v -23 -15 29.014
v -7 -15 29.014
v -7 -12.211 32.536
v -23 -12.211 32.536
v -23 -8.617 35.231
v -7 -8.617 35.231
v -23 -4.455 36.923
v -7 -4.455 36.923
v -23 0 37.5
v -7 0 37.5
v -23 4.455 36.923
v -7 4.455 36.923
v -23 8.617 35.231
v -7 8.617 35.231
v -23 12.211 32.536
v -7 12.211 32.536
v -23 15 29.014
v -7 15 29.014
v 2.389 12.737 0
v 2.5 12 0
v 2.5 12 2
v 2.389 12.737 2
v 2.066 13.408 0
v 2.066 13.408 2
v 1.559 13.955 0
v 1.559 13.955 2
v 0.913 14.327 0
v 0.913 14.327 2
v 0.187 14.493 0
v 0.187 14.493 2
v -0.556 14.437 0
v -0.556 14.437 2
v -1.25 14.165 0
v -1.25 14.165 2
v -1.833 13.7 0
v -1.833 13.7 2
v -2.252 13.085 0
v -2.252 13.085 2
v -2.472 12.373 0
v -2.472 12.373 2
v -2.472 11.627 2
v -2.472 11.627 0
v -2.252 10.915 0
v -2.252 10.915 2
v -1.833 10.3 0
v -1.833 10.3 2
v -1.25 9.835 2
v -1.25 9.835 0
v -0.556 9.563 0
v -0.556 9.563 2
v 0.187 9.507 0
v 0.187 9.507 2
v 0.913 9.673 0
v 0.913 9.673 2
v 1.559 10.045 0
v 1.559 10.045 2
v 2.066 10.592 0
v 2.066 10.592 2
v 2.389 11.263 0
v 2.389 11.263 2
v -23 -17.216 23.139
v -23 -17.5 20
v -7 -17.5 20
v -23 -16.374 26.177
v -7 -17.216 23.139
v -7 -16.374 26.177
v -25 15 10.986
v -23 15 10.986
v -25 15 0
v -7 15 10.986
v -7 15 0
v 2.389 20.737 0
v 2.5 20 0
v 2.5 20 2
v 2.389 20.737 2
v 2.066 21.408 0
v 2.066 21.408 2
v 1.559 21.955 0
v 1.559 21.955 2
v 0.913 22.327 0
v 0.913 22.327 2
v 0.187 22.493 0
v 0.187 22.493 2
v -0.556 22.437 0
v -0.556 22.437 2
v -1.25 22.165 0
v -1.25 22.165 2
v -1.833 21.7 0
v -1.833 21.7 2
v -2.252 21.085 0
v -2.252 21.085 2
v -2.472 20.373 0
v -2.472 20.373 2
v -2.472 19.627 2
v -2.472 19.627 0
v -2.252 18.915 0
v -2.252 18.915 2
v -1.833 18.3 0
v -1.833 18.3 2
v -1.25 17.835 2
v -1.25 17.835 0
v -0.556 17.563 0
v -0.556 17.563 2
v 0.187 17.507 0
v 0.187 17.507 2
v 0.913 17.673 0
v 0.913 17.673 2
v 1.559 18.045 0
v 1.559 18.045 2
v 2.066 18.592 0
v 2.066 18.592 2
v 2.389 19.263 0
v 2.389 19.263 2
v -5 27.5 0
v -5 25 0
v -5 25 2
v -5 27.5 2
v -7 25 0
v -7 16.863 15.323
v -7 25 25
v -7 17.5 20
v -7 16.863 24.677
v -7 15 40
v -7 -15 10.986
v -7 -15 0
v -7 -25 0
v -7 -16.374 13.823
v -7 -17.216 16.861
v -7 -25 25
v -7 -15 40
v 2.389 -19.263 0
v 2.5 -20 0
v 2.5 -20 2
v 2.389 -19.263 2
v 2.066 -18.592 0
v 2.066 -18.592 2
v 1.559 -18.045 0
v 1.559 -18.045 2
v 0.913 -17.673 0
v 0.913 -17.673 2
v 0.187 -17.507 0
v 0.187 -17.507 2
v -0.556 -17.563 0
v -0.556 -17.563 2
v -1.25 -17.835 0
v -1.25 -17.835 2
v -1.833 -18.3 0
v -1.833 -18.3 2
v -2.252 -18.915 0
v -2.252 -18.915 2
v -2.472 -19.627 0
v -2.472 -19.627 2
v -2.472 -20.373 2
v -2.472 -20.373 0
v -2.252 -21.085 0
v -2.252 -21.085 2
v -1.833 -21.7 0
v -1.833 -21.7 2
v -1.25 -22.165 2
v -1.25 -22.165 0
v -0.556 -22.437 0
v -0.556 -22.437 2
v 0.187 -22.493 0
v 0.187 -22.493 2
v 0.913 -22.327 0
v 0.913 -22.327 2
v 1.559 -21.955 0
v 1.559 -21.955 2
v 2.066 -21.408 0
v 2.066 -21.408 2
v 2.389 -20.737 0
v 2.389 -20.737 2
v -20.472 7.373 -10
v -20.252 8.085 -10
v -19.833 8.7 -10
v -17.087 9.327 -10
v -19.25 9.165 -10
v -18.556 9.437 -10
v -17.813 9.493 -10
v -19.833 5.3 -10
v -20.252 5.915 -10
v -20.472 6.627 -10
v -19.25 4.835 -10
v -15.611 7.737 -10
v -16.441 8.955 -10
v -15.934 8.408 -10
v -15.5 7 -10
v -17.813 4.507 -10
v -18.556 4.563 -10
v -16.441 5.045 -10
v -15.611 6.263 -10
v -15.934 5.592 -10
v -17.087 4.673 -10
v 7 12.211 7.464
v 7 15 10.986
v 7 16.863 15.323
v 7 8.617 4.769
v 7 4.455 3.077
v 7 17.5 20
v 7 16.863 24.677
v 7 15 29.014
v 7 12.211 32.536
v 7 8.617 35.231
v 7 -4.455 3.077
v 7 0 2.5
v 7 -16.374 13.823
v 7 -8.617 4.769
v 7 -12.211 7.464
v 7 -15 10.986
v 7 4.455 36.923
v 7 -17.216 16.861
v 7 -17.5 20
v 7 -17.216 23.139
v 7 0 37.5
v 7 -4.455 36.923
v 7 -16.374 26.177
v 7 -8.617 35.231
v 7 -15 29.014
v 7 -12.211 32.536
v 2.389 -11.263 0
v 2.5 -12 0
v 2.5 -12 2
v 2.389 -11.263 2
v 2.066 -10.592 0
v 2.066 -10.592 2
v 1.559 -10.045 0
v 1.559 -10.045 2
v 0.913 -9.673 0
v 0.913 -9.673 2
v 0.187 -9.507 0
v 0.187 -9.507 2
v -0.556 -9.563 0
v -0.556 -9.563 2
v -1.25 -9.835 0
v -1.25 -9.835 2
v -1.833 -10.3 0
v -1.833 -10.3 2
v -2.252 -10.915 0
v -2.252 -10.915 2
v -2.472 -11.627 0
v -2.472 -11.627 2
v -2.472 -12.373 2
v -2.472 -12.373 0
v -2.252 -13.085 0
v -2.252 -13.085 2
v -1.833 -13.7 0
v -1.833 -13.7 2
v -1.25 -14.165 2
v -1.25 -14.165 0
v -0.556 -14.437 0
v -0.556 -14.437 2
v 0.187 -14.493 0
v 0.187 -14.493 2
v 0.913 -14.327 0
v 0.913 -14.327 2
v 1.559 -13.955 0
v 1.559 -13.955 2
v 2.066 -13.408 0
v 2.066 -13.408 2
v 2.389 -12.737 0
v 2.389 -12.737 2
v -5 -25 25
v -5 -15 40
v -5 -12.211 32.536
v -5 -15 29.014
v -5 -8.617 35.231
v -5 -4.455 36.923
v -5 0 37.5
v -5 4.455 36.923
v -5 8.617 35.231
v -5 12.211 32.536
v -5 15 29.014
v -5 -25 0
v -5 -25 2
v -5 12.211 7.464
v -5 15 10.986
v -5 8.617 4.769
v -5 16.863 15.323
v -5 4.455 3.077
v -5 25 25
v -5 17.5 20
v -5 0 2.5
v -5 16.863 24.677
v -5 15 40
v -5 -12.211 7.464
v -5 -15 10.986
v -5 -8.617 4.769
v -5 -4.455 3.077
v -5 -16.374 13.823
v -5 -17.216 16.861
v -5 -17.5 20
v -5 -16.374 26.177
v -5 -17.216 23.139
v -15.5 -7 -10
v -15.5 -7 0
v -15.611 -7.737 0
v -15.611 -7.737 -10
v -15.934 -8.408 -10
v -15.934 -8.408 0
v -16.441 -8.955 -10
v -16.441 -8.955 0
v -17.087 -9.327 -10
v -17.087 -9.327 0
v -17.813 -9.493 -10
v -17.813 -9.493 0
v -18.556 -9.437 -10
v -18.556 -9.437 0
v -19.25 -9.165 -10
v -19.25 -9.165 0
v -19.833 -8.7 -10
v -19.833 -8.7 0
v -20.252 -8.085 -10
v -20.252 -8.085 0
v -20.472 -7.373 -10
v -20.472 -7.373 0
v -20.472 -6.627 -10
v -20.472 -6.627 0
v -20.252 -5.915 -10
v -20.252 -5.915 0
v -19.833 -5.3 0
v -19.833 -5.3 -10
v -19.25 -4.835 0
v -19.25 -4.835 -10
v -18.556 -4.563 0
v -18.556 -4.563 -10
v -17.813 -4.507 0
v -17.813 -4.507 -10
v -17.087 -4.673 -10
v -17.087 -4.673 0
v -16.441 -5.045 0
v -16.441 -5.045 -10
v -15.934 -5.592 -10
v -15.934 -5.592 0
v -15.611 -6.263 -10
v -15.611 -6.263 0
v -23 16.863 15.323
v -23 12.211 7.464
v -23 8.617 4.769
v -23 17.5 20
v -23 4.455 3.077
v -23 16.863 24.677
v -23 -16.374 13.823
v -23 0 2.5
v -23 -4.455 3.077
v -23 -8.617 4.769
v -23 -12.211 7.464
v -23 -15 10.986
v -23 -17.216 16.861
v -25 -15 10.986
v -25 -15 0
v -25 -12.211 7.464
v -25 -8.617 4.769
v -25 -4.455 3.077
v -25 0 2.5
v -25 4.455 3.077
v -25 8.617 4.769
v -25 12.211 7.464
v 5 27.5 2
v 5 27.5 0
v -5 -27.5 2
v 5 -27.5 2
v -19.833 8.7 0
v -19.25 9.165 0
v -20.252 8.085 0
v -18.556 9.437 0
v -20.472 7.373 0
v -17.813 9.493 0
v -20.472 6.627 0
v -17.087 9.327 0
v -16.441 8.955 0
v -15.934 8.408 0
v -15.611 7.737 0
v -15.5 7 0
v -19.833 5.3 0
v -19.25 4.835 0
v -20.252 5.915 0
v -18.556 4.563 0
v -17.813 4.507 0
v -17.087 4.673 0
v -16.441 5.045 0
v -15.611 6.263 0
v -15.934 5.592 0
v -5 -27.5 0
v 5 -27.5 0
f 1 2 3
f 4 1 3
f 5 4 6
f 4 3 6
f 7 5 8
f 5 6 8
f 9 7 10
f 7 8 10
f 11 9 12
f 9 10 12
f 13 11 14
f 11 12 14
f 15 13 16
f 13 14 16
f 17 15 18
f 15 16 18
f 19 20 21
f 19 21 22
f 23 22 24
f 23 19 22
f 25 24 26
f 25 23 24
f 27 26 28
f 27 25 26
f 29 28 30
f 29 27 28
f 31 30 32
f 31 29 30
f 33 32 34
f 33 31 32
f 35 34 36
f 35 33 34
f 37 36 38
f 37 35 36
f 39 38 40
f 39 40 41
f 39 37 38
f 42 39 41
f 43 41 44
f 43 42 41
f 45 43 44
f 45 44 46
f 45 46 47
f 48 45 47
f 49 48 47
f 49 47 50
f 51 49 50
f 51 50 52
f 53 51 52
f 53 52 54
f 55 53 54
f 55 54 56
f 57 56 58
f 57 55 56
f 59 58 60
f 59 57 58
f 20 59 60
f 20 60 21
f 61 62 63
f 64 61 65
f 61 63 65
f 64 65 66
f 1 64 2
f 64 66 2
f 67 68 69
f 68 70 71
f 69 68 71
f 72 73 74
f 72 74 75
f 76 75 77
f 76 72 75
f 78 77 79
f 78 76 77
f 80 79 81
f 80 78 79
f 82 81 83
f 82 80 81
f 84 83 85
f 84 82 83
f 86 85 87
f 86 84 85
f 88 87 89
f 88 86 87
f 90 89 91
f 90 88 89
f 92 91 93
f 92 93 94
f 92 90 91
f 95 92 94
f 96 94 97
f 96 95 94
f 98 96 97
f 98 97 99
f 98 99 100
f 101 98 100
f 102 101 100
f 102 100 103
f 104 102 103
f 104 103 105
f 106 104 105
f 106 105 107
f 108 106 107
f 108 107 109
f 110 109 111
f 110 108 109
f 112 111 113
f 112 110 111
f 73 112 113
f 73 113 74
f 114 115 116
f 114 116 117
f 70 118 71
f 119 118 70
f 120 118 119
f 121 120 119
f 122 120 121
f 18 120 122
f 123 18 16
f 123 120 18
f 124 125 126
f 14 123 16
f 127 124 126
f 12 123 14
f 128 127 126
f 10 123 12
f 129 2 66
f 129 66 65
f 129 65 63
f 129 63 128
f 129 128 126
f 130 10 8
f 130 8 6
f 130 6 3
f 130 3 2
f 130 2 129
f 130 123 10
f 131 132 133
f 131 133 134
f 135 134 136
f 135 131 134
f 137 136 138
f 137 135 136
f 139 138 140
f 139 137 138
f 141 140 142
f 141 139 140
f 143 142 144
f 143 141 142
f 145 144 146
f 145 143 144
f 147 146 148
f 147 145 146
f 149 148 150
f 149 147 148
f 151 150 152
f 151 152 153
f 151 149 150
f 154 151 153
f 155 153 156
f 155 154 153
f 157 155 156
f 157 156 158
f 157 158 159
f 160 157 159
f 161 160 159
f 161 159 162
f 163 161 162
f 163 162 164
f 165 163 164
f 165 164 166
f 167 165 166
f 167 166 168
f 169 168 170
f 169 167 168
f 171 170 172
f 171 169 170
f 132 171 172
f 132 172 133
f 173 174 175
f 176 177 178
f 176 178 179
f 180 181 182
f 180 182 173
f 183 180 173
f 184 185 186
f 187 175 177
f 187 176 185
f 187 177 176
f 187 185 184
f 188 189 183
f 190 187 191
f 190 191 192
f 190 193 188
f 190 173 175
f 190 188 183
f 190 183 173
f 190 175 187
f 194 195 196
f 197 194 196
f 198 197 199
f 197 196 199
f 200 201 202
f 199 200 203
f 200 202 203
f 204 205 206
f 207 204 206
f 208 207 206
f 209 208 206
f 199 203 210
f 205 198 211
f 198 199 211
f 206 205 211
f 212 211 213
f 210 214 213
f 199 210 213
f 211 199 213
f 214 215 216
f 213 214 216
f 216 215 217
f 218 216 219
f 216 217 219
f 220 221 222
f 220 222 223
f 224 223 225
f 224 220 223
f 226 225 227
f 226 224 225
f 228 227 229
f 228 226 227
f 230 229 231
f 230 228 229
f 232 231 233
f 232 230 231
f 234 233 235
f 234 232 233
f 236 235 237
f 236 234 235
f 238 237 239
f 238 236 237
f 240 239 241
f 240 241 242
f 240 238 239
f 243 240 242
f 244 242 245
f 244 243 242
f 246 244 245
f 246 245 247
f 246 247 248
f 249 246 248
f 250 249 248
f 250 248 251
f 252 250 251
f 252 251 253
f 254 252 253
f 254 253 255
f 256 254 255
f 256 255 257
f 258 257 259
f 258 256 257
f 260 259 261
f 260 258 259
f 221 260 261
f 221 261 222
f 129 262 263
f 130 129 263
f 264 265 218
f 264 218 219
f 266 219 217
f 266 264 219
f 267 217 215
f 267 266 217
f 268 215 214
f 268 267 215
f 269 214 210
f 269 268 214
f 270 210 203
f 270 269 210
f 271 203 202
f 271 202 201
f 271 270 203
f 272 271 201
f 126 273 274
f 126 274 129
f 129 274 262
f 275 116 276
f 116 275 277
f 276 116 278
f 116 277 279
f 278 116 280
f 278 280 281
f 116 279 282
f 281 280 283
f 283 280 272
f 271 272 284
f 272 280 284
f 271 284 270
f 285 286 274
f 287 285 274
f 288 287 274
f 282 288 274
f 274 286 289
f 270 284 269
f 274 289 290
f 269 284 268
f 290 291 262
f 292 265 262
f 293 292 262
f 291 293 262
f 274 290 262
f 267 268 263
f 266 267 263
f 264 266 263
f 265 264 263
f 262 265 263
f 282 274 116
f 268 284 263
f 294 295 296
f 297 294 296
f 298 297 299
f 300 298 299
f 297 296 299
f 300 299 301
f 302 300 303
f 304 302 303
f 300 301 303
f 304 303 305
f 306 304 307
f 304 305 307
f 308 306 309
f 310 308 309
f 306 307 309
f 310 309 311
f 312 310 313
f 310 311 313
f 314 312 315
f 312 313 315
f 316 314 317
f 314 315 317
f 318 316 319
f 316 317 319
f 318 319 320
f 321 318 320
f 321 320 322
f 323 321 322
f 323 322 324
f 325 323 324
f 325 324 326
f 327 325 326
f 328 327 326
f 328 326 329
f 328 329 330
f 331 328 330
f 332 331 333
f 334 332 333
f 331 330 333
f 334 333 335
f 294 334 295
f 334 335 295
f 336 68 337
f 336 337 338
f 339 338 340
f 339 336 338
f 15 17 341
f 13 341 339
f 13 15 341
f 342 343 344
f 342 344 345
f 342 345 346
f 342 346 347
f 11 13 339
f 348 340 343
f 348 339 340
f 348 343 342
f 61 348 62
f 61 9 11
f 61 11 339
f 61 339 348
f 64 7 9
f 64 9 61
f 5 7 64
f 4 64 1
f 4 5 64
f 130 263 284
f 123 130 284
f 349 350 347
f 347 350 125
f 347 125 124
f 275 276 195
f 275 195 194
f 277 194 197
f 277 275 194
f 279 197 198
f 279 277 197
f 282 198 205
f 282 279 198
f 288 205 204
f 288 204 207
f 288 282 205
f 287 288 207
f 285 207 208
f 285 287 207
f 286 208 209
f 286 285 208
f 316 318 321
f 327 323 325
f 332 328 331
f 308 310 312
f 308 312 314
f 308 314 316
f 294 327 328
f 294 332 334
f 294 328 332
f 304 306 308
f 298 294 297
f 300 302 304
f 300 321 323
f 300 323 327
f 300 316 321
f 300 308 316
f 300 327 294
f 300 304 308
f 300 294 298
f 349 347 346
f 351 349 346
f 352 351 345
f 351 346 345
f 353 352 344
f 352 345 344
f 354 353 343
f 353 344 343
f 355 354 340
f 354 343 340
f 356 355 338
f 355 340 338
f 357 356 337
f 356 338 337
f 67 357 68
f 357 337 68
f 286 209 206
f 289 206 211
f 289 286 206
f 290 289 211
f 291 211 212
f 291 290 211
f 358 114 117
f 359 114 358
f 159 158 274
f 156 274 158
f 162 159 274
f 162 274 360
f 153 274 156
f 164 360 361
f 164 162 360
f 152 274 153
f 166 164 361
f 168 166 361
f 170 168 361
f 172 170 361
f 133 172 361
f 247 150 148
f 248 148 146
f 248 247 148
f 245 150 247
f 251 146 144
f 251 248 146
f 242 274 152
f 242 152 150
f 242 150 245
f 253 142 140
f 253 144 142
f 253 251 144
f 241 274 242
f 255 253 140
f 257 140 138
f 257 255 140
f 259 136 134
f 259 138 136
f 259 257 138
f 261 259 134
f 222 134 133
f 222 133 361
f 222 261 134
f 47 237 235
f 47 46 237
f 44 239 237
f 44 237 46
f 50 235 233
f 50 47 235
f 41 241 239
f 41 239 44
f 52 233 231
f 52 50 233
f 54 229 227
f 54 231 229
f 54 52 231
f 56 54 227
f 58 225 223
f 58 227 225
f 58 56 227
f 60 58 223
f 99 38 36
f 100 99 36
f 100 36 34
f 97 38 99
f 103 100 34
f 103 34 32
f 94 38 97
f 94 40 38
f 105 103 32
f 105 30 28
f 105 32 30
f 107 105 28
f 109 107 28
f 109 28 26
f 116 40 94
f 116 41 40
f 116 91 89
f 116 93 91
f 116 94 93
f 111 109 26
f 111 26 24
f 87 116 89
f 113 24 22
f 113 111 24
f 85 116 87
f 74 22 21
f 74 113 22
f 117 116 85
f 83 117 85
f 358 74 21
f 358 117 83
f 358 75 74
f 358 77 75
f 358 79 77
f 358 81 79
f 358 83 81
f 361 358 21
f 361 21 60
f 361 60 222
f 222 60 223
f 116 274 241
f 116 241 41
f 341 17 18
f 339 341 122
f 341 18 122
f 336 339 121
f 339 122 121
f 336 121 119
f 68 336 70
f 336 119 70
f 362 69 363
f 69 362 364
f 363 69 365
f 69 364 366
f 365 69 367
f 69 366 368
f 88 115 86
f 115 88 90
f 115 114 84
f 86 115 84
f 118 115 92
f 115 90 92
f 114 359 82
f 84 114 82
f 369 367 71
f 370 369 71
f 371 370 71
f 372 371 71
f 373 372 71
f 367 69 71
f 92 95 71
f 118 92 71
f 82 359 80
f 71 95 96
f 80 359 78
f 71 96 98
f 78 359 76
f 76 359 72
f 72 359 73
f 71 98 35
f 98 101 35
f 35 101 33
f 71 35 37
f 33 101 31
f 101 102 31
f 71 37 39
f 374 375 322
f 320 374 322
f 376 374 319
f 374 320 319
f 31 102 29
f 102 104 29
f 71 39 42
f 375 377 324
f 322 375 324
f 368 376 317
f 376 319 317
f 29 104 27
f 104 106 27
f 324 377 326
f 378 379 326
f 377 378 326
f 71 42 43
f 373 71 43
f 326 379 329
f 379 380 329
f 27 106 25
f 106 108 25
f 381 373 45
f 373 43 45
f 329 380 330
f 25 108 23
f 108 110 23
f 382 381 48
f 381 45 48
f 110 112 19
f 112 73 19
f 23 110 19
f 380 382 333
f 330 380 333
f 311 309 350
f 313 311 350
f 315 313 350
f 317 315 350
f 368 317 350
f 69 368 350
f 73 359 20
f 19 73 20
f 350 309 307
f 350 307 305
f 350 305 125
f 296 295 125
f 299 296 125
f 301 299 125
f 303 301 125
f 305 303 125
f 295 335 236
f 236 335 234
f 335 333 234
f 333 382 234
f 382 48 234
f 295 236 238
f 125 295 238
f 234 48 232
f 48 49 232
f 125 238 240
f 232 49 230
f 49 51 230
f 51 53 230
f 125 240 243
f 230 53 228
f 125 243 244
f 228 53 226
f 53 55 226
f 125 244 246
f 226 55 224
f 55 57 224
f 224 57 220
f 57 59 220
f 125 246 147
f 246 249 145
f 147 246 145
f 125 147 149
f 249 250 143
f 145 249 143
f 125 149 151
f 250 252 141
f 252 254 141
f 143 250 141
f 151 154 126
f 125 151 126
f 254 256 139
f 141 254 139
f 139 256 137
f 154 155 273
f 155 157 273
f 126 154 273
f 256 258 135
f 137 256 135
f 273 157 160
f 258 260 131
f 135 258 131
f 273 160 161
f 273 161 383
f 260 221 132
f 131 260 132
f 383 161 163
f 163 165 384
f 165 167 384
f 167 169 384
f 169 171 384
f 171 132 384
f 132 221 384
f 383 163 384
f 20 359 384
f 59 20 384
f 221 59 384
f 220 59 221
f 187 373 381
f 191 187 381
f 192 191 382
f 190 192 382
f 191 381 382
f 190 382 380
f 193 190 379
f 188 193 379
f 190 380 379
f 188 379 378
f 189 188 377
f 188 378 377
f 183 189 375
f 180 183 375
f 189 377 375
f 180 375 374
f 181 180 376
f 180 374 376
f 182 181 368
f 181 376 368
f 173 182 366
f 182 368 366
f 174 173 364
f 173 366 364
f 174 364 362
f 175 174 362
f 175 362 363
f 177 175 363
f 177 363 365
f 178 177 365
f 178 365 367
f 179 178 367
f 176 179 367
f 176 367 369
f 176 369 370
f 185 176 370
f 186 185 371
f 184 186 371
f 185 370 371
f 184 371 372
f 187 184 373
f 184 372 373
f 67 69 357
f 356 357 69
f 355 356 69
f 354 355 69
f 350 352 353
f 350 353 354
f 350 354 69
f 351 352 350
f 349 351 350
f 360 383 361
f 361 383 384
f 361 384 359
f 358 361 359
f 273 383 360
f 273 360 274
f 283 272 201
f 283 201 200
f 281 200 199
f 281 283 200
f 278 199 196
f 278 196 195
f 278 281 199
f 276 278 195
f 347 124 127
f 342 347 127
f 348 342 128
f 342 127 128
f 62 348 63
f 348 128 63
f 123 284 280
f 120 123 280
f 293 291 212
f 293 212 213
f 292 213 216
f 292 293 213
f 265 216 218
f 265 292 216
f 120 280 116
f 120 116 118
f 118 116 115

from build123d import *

# Parameters (mm, degrees)
F0_W          = 10
F0_H          = 55
F0_R          = 2.5
F1_DEPTH      = 2
F2_W          = 30
F2_H          = 2
F2_W_2        = 10
F3_DEPTH      = 2
F4_DEPTH      = 12
F4_DEPTH_BACK = 18
F5_DEPTH      = 20
F6_R          = 2.5
F7_DEPTH      = 10


with BuildPart() as f1:
    # F0 (on Top) → F1 (new body)
    with BuildSketch(Plane.XY):
        Rectangle(F0_W, F0_H)
        with Locations((0, -20)):
            Circle(F0_R, mode=Mode.SUBTRACT)
        with Locations((0, -12)):
            Circle(F0_R, mode=Mode.SUBTRACT)
        with Locations((0, 12)):
            Circle(F0_R, mode=Mode.SUBTRACT)
        with Locations((0, 20)):
            Circle(F0_R, mode=Mode.SUBTRACT)
    extrude(amount=F1_DEPTH)

    # F2 (on face) → F3 (join)
    with BuildSketch(Plane(origin=(-5, 0, 0), x_dir=(0, -1, 0), z_dir=(-1, 0, 0))):
        with Locations((0, 1)):
            Rectangle(F2_W, F2_H)
        with Locations((-20, 1)):
            Rectangle(F2_W_2, F2_H)
        with Locations((20, 1)):
            Rectangle(F2_W_2, F2_H)
        with BuildLine():
            Line((-25, 25), (-25, 2))
            Line((-25, 2), (-15, 2))
            Line((-15, 2), (-15, 10.9861218113))
            ThreePointArc((-15, 10.9861218113), (-17.5, 20), (-15, 29.0138781887))
            Line((-15, 29.0138781887), (-15, 40))
            Line((-15, 40), (-25, 25))
        make_face()
        with BuildLine():
            Line((-15, 10.9861218113), (-15, 2))
            Line((-15, 2), (15, 2))
            Line((15, 2), (15, 10.9861218113))
            ThreePointArc((15, 10.9861218113), (0, 2.5), (-15, 10.9861218113))
        make_face()
        with BuildLine():
            Line((15, 10.9861218113), (15, 2))
            Line((15, 2), (25, 2))
            Line((25, 2), (25, 25))
            Line((25, 25), (15, 40))
            Line((15, 40), (15, 29.0138781887))
            ThreePointArc((15, 29.0138781887), (16.863421954, 24.6770717335), (17.5, 20))
            ThreePointArc((17.5, 20), (16.863421954, 15.3229282665), (15, 10.9861218113))
        make_face()
        with BuildLine():
            Line((0, 40), (-15, 40))
            Line((-15, 40), (-15, 29.0138781887))
            ThreePointArc((-15, 29.0138781887), (0, 37.5), (15, 29.0138781887))
            Line((15, 29.0138781887), (15, 40))
            Line((15, 40), (0, 40))
        make_face()
    extrude(amount=F3_DEPTH)

    # F2 (on face) → F4 (join, two sides)
    with BuildSketch(Plane(origin=(-5, 0, 0), x_dir=(0, -1, 0), z_dir=(-1, 0, 0))) as f4_sk:
        with BuildLine():
            Line((-15, 29.0138781887), (-15, 10.9861218113))
            ThreePointArc((-15, 10.9861218113), (0, 2.5), (15, 10.9861218113))
            Line((15, 10.9861218113), (15, 29.0138781887))
            ThreePointArc((15, 29.0138781887), (0, 37.5), (-15, 29.0138781887))
        make_face()
        with BuildLine():
            Line((15, 29.0138781887), (15, 10.9861218113))
            ThreePointArc((15, 10.9861218113), (16.863421954, 15.3229282665), (17.5, 20))
            ThreePointArc((17.5, 20), (16.863421954, 24.6770717335), (15, 29.0138781887))
        make_face()
        with BuildLine():
            ThreePointArc((-15, 29.0138781887), (-17.5, 20), (-15, 10.9861218113))
            Line((-15, 10.9861218113), (-15, 29.0138781887))
        make_face()
    extrude(amount=-F4_DEPTH)
    extrude(f4_sk.sketch, amount=F4_DEPTH_BACK)

    # F2 (on face) → F5 (join)
    with BuildSketch(Plane(origin=(-5, 0, 0), x_dir=(0, -1, 0), z_dir=(-1, 0, 0))):
        with BuildLine():
            Line((-15, 10.9861218113), (-15, 2))
            Line((-15, 2), (15, 2))
            Line((15, 2), (15, 10.9861218113))
            ThreePointArc((15, 10.9861218113), (0, 2.5), (-15, 10.9861218113))
        make_face()
        with Locations((0, 1)):
            Rectangle(F2_W, F2_H)
    extrude(amount=F5_DEPTH)

    # F6 (on face) → F7 (join)
    with BuildSketch(Plane(origin=(0, 0, 0), x_dir=(1, 0, 0), z_dir=(0, 0, -1))):
        with Locations((-18, -7)):
            Circle(F6_R)
        with Locations((-18, 7)):
            Circle(F6_R)
    extrude(amount=F7_DEPTH)


solid = f1.part
